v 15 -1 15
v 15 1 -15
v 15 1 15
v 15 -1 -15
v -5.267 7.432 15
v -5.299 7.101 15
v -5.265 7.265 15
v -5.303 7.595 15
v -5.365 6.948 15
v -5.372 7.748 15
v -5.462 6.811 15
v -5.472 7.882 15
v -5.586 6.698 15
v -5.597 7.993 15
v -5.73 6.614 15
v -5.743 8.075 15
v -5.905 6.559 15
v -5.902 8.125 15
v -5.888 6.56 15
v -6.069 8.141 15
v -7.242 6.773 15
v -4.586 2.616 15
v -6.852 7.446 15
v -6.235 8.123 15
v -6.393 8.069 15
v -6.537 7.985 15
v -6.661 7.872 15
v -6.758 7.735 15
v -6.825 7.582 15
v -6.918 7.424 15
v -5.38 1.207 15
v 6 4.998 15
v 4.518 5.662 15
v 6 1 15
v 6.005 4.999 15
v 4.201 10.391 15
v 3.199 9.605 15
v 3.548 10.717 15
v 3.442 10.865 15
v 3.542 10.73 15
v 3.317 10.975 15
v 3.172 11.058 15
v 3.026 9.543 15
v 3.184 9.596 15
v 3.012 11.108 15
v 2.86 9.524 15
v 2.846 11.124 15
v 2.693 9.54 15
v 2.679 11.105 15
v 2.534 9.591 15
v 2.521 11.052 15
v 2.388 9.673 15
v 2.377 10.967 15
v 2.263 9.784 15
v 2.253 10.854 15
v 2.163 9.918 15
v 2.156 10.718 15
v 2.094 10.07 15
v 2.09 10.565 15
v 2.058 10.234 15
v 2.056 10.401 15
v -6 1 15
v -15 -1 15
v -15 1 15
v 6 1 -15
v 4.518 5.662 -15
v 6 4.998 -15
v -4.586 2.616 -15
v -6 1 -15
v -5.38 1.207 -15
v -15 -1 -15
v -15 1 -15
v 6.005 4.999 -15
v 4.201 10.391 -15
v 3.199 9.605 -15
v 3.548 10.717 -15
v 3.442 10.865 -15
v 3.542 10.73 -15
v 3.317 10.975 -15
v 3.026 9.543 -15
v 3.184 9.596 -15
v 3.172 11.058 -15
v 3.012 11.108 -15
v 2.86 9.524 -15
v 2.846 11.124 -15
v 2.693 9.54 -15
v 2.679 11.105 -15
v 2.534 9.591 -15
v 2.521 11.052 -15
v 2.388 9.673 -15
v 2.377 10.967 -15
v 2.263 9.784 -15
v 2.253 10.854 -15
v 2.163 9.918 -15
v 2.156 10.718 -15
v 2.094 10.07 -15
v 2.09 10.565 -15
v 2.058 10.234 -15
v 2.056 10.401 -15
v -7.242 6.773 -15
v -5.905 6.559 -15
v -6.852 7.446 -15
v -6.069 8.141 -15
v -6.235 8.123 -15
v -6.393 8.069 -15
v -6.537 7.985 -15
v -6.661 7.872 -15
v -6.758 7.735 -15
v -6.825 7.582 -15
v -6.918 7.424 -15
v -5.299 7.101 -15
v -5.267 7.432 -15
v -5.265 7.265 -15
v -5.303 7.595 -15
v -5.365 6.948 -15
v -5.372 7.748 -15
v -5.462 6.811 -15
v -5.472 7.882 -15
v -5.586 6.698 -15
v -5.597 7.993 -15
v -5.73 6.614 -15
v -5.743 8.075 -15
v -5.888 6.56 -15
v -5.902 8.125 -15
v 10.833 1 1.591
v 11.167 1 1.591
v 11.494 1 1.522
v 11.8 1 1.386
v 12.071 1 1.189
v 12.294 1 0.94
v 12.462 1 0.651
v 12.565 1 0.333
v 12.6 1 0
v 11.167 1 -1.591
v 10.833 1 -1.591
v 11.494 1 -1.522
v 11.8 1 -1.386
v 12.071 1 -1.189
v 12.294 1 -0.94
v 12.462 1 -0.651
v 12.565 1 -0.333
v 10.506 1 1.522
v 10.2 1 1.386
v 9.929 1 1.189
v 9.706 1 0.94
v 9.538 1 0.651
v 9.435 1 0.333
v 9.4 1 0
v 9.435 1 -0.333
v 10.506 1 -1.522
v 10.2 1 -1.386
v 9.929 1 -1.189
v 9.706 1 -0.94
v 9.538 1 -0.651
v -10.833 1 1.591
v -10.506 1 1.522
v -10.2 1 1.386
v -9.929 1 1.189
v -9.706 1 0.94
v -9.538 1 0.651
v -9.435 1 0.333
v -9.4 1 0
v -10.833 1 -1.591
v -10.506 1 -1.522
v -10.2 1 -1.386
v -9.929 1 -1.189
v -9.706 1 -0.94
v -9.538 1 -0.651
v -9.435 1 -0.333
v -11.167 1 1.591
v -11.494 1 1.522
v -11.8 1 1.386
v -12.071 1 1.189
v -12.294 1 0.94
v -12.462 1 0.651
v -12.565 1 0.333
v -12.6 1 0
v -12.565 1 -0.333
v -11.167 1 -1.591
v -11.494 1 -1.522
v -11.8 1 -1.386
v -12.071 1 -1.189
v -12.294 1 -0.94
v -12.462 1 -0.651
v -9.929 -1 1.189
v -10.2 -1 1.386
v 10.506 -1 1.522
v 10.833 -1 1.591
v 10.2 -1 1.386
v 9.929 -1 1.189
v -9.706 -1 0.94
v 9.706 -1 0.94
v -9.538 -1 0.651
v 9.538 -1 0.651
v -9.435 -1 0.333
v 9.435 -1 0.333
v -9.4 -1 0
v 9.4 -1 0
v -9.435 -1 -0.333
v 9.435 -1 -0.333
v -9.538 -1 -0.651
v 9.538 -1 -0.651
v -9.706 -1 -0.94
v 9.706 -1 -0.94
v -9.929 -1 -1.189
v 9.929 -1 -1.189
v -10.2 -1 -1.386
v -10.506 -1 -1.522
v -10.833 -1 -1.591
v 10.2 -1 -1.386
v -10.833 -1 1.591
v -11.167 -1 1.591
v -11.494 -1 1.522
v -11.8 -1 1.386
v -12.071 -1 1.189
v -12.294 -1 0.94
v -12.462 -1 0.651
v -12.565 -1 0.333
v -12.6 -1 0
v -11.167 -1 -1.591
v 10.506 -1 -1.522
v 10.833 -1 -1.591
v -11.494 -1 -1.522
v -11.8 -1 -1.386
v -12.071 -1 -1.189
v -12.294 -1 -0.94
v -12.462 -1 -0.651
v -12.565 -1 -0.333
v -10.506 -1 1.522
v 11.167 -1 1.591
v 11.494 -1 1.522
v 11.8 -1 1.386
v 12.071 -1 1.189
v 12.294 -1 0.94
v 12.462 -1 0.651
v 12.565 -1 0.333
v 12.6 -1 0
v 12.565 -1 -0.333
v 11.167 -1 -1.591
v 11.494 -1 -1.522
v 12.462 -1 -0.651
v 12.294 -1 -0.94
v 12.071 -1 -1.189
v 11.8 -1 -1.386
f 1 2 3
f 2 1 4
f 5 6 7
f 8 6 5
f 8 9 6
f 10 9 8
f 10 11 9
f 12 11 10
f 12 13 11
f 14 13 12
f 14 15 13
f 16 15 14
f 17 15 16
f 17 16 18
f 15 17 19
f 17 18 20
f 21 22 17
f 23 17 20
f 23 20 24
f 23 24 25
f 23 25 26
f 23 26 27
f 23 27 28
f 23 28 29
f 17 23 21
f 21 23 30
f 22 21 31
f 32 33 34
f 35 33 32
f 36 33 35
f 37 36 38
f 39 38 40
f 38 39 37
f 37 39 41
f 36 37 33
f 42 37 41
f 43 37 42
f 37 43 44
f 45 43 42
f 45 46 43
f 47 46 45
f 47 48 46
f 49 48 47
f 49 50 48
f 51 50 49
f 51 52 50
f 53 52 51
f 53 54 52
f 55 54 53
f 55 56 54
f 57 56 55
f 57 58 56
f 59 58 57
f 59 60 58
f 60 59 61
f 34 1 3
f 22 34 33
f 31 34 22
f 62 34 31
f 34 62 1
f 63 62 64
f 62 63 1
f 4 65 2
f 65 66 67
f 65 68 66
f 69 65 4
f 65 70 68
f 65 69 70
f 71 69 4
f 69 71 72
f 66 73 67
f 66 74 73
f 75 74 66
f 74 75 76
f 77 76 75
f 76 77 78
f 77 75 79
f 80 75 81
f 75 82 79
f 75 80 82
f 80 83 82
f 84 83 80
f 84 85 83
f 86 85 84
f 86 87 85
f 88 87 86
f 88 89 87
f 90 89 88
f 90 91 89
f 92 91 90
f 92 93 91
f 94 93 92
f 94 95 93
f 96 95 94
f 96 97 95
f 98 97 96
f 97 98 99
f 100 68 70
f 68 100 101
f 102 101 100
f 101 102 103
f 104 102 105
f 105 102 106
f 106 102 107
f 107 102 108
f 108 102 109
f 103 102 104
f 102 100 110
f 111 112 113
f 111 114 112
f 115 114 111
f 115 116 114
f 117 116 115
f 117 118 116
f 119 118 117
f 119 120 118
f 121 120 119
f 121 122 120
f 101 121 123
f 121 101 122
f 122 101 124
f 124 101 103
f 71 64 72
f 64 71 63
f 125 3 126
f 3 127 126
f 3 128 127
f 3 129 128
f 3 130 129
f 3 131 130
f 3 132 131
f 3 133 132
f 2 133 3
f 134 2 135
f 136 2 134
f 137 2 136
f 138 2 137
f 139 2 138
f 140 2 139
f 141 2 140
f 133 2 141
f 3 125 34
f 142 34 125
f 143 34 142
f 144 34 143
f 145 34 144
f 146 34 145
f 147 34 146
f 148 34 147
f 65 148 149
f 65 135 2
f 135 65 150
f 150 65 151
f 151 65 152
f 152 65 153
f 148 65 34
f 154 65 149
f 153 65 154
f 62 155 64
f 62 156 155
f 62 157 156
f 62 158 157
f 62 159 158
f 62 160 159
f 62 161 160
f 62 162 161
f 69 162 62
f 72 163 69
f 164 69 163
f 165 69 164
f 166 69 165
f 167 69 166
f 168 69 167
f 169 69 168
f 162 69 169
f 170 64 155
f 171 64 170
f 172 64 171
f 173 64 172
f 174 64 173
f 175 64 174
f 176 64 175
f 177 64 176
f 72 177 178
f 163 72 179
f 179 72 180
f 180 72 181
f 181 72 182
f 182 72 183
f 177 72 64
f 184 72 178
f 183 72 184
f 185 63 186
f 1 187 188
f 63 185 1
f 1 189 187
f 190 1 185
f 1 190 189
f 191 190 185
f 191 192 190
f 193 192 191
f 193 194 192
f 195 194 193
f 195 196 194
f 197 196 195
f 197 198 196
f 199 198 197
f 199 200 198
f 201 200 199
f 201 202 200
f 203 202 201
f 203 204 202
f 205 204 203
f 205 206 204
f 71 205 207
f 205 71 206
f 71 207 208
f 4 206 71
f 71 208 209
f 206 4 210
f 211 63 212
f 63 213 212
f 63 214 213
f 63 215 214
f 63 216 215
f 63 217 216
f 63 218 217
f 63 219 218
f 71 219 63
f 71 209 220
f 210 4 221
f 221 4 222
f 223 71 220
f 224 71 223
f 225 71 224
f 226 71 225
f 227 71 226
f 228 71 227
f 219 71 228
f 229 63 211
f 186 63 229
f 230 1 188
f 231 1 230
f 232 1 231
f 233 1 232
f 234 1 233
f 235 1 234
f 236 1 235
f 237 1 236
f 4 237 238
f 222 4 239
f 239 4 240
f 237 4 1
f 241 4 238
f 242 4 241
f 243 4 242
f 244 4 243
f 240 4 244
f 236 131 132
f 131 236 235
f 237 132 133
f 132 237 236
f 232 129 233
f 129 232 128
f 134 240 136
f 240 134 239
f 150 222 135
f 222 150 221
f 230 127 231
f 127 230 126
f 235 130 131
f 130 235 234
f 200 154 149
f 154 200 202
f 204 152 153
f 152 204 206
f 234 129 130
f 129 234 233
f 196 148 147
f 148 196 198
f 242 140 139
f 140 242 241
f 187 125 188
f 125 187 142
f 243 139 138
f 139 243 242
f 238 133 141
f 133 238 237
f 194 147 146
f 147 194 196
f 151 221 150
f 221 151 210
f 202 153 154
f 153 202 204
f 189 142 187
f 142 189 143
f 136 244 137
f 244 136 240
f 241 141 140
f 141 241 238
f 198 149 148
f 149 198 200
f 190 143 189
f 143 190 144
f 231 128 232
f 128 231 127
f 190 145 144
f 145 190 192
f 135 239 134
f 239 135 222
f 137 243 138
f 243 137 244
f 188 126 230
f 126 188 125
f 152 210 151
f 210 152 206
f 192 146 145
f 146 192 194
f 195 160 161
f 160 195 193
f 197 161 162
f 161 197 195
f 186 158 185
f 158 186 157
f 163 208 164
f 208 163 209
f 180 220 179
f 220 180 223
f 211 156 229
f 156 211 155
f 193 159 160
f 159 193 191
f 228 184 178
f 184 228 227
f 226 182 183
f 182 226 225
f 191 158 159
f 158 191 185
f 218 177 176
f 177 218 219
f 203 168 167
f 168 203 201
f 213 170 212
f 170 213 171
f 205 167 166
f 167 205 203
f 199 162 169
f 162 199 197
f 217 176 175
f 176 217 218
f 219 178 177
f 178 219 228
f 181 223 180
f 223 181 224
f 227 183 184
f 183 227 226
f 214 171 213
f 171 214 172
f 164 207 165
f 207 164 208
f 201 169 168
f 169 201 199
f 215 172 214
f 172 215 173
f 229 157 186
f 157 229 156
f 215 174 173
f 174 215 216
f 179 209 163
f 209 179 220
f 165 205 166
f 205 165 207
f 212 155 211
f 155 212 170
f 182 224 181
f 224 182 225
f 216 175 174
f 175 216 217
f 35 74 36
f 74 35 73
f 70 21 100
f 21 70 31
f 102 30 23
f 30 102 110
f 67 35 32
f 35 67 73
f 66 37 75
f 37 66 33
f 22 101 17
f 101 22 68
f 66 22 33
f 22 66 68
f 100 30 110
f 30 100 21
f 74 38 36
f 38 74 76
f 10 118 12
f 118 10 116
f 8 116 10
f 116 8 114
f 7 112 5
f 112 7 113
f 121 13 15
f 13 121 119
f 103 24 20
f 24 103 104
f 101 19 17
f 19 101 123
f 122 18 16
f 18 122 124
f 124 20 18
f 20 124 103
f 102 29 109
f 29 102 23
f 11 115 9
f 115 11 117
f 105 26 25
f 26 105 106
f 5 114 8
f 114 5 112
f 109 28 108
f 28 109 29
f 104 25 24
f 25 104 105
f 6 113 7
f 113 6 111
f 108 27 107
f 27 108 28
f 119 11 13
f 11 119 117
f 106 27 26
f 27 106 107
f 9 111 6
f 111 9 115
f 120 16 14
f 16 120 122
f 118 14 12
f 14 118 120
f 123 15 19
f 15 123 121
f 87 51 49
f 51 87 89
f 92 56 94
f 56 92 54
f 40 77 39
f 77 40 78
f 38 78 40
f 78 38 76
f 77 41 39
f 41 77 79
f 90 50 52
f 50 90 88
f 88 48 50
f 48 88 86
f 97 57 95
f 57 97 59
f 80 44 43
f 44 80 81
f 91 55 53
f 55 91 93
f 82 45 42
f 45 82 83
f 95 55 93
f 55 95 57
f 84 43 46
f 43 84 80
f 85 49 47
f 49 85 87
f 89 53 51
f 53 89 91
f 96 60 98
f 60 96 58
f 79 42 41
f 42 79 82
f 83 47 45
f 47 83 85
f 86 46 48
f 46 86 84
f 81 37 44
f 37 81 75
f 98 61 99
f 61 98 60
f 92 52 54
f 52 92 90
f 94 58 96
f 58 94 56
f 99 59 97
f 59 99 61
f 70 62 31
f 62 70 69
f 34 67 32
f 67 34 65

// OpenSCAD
/***********************************************************
 *                                                         *
 *                  IKEA Dioder Clip Library               *
 *                  ========================               *
 *                                                         *
 * Generate simple clip profiles that fit IKEA's Dioder    *
 * light strips. You need to combine them with your design *
 * to make a functional mount. This library only generates *
 * the bit that physically clips around the strip.         *
 *                                                         *
 * Designed by: https://www.thingiverse.com/smorgo         *
 *                                                         *
 ***********************************************************/
 
 
 //demo();
 //main();
 surface_clip();
 
 module surface_clip(w=30) {
    difference() {
        cube([30,2,w], center=true);
        translate([11,0,0]) {
            rotate([90,0,0]) {
                cylinder(d=3.2,h=4,center=true,$fn=30);
            }
        }
        translate([-11,0,0]) {
            rotate([90,0,0]) {
                cylinder(d=3.2,h=4,center=true,$fn=30);
            }
        }
    }
     
     translate([0.22,3.38,0]) {
        rotate([0,0,18.5]) {
            dioder_clip(w);
        }
     }


     translate([6,5,w/2]) {
         rotate([0,90,180]) {
            prism(w,4,12);
         }
     }
 }
 
 module corner_clip(w=20) {
     dioder_clip(w);
     fixing(w);
     mirror([1,0,0]) fixing(w);
 }
 
 module fixing(w) {
    translate([0,-0.3,-w/2]) {
        rotate([0,0,-45]) {
            difference() {
                cube([12,1.5,w]);
                translate([8,0.8,w/2]) rotate([90,0,0]) cylinder(d=2,h=2,center=true,$fn=30);
            }
        }
     }
 }
 
 module demo() {
    dioder_clip(w = 6); 
}

module dioder_clip(w = 1) {
    translate([0,4,0]) {
        difference() {
            translate([0,-1.1,0]) {
                cube([12,6.4,w], center=true);
            }
            cube([9.6,6.4,w+0.1], center=true);
            translate([-6,3,0]) {
                rotate([0,0,45]) {
                    cube([2,2,w+0.1], center=true);
                }
            }
            translate([6,2.8,0]) {
                rotate([0,0,45]) {
                    cube([2,2,w+0.1], center=true);
                }
            }
        }
        translate([-4.7,1.75,0]) {
            cylinder(r=0.8,h=w,center=true,$fn=30);
        }
        translate([4.7,1.75,0]) {
            cylinder(r=0.8,h=w,center=true,$fn=30);
        }
    }
} 

module prism(l, w, h){
    polyhedron(
        points=[[0,0,0], [l,0,0], [l,w,0], [0,w,0], [0,w,h], [l,w,h]],
        faces=[[0,1,2,3],[5,4,3,2],[0,4,5,1],[0,3,4],[5,2,1]]
    );
}
